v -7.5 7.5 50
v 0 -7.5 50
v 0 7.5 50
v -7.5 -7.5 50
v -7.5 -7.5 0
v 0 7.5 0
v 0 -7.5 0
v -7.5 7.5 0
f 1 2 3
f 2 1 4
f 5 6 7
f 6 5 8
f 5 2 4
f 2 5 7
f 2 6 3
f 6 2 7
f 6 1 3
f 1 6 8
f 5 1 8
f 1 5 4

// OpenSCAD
// file: Library/center.scad
module center(axis){
	translate((axis / -2.0)){
		children();
	}
}
// main file
use <Library/center.scad>

diameter = 15;
height = 50;

//Positive space of place behind the chimney.
//To difference with chimney later.
module CylinderDispenser_Dispenser_Flue_FlatBack(diameter, height){
	radius = diameter / 2.0;
	center([diameter, diameter, 0]){
		cube([radius, diameter, height]);
	}
}
CylinderDispenser_Dispenser_Flue_FlatBack(diameter, height);
